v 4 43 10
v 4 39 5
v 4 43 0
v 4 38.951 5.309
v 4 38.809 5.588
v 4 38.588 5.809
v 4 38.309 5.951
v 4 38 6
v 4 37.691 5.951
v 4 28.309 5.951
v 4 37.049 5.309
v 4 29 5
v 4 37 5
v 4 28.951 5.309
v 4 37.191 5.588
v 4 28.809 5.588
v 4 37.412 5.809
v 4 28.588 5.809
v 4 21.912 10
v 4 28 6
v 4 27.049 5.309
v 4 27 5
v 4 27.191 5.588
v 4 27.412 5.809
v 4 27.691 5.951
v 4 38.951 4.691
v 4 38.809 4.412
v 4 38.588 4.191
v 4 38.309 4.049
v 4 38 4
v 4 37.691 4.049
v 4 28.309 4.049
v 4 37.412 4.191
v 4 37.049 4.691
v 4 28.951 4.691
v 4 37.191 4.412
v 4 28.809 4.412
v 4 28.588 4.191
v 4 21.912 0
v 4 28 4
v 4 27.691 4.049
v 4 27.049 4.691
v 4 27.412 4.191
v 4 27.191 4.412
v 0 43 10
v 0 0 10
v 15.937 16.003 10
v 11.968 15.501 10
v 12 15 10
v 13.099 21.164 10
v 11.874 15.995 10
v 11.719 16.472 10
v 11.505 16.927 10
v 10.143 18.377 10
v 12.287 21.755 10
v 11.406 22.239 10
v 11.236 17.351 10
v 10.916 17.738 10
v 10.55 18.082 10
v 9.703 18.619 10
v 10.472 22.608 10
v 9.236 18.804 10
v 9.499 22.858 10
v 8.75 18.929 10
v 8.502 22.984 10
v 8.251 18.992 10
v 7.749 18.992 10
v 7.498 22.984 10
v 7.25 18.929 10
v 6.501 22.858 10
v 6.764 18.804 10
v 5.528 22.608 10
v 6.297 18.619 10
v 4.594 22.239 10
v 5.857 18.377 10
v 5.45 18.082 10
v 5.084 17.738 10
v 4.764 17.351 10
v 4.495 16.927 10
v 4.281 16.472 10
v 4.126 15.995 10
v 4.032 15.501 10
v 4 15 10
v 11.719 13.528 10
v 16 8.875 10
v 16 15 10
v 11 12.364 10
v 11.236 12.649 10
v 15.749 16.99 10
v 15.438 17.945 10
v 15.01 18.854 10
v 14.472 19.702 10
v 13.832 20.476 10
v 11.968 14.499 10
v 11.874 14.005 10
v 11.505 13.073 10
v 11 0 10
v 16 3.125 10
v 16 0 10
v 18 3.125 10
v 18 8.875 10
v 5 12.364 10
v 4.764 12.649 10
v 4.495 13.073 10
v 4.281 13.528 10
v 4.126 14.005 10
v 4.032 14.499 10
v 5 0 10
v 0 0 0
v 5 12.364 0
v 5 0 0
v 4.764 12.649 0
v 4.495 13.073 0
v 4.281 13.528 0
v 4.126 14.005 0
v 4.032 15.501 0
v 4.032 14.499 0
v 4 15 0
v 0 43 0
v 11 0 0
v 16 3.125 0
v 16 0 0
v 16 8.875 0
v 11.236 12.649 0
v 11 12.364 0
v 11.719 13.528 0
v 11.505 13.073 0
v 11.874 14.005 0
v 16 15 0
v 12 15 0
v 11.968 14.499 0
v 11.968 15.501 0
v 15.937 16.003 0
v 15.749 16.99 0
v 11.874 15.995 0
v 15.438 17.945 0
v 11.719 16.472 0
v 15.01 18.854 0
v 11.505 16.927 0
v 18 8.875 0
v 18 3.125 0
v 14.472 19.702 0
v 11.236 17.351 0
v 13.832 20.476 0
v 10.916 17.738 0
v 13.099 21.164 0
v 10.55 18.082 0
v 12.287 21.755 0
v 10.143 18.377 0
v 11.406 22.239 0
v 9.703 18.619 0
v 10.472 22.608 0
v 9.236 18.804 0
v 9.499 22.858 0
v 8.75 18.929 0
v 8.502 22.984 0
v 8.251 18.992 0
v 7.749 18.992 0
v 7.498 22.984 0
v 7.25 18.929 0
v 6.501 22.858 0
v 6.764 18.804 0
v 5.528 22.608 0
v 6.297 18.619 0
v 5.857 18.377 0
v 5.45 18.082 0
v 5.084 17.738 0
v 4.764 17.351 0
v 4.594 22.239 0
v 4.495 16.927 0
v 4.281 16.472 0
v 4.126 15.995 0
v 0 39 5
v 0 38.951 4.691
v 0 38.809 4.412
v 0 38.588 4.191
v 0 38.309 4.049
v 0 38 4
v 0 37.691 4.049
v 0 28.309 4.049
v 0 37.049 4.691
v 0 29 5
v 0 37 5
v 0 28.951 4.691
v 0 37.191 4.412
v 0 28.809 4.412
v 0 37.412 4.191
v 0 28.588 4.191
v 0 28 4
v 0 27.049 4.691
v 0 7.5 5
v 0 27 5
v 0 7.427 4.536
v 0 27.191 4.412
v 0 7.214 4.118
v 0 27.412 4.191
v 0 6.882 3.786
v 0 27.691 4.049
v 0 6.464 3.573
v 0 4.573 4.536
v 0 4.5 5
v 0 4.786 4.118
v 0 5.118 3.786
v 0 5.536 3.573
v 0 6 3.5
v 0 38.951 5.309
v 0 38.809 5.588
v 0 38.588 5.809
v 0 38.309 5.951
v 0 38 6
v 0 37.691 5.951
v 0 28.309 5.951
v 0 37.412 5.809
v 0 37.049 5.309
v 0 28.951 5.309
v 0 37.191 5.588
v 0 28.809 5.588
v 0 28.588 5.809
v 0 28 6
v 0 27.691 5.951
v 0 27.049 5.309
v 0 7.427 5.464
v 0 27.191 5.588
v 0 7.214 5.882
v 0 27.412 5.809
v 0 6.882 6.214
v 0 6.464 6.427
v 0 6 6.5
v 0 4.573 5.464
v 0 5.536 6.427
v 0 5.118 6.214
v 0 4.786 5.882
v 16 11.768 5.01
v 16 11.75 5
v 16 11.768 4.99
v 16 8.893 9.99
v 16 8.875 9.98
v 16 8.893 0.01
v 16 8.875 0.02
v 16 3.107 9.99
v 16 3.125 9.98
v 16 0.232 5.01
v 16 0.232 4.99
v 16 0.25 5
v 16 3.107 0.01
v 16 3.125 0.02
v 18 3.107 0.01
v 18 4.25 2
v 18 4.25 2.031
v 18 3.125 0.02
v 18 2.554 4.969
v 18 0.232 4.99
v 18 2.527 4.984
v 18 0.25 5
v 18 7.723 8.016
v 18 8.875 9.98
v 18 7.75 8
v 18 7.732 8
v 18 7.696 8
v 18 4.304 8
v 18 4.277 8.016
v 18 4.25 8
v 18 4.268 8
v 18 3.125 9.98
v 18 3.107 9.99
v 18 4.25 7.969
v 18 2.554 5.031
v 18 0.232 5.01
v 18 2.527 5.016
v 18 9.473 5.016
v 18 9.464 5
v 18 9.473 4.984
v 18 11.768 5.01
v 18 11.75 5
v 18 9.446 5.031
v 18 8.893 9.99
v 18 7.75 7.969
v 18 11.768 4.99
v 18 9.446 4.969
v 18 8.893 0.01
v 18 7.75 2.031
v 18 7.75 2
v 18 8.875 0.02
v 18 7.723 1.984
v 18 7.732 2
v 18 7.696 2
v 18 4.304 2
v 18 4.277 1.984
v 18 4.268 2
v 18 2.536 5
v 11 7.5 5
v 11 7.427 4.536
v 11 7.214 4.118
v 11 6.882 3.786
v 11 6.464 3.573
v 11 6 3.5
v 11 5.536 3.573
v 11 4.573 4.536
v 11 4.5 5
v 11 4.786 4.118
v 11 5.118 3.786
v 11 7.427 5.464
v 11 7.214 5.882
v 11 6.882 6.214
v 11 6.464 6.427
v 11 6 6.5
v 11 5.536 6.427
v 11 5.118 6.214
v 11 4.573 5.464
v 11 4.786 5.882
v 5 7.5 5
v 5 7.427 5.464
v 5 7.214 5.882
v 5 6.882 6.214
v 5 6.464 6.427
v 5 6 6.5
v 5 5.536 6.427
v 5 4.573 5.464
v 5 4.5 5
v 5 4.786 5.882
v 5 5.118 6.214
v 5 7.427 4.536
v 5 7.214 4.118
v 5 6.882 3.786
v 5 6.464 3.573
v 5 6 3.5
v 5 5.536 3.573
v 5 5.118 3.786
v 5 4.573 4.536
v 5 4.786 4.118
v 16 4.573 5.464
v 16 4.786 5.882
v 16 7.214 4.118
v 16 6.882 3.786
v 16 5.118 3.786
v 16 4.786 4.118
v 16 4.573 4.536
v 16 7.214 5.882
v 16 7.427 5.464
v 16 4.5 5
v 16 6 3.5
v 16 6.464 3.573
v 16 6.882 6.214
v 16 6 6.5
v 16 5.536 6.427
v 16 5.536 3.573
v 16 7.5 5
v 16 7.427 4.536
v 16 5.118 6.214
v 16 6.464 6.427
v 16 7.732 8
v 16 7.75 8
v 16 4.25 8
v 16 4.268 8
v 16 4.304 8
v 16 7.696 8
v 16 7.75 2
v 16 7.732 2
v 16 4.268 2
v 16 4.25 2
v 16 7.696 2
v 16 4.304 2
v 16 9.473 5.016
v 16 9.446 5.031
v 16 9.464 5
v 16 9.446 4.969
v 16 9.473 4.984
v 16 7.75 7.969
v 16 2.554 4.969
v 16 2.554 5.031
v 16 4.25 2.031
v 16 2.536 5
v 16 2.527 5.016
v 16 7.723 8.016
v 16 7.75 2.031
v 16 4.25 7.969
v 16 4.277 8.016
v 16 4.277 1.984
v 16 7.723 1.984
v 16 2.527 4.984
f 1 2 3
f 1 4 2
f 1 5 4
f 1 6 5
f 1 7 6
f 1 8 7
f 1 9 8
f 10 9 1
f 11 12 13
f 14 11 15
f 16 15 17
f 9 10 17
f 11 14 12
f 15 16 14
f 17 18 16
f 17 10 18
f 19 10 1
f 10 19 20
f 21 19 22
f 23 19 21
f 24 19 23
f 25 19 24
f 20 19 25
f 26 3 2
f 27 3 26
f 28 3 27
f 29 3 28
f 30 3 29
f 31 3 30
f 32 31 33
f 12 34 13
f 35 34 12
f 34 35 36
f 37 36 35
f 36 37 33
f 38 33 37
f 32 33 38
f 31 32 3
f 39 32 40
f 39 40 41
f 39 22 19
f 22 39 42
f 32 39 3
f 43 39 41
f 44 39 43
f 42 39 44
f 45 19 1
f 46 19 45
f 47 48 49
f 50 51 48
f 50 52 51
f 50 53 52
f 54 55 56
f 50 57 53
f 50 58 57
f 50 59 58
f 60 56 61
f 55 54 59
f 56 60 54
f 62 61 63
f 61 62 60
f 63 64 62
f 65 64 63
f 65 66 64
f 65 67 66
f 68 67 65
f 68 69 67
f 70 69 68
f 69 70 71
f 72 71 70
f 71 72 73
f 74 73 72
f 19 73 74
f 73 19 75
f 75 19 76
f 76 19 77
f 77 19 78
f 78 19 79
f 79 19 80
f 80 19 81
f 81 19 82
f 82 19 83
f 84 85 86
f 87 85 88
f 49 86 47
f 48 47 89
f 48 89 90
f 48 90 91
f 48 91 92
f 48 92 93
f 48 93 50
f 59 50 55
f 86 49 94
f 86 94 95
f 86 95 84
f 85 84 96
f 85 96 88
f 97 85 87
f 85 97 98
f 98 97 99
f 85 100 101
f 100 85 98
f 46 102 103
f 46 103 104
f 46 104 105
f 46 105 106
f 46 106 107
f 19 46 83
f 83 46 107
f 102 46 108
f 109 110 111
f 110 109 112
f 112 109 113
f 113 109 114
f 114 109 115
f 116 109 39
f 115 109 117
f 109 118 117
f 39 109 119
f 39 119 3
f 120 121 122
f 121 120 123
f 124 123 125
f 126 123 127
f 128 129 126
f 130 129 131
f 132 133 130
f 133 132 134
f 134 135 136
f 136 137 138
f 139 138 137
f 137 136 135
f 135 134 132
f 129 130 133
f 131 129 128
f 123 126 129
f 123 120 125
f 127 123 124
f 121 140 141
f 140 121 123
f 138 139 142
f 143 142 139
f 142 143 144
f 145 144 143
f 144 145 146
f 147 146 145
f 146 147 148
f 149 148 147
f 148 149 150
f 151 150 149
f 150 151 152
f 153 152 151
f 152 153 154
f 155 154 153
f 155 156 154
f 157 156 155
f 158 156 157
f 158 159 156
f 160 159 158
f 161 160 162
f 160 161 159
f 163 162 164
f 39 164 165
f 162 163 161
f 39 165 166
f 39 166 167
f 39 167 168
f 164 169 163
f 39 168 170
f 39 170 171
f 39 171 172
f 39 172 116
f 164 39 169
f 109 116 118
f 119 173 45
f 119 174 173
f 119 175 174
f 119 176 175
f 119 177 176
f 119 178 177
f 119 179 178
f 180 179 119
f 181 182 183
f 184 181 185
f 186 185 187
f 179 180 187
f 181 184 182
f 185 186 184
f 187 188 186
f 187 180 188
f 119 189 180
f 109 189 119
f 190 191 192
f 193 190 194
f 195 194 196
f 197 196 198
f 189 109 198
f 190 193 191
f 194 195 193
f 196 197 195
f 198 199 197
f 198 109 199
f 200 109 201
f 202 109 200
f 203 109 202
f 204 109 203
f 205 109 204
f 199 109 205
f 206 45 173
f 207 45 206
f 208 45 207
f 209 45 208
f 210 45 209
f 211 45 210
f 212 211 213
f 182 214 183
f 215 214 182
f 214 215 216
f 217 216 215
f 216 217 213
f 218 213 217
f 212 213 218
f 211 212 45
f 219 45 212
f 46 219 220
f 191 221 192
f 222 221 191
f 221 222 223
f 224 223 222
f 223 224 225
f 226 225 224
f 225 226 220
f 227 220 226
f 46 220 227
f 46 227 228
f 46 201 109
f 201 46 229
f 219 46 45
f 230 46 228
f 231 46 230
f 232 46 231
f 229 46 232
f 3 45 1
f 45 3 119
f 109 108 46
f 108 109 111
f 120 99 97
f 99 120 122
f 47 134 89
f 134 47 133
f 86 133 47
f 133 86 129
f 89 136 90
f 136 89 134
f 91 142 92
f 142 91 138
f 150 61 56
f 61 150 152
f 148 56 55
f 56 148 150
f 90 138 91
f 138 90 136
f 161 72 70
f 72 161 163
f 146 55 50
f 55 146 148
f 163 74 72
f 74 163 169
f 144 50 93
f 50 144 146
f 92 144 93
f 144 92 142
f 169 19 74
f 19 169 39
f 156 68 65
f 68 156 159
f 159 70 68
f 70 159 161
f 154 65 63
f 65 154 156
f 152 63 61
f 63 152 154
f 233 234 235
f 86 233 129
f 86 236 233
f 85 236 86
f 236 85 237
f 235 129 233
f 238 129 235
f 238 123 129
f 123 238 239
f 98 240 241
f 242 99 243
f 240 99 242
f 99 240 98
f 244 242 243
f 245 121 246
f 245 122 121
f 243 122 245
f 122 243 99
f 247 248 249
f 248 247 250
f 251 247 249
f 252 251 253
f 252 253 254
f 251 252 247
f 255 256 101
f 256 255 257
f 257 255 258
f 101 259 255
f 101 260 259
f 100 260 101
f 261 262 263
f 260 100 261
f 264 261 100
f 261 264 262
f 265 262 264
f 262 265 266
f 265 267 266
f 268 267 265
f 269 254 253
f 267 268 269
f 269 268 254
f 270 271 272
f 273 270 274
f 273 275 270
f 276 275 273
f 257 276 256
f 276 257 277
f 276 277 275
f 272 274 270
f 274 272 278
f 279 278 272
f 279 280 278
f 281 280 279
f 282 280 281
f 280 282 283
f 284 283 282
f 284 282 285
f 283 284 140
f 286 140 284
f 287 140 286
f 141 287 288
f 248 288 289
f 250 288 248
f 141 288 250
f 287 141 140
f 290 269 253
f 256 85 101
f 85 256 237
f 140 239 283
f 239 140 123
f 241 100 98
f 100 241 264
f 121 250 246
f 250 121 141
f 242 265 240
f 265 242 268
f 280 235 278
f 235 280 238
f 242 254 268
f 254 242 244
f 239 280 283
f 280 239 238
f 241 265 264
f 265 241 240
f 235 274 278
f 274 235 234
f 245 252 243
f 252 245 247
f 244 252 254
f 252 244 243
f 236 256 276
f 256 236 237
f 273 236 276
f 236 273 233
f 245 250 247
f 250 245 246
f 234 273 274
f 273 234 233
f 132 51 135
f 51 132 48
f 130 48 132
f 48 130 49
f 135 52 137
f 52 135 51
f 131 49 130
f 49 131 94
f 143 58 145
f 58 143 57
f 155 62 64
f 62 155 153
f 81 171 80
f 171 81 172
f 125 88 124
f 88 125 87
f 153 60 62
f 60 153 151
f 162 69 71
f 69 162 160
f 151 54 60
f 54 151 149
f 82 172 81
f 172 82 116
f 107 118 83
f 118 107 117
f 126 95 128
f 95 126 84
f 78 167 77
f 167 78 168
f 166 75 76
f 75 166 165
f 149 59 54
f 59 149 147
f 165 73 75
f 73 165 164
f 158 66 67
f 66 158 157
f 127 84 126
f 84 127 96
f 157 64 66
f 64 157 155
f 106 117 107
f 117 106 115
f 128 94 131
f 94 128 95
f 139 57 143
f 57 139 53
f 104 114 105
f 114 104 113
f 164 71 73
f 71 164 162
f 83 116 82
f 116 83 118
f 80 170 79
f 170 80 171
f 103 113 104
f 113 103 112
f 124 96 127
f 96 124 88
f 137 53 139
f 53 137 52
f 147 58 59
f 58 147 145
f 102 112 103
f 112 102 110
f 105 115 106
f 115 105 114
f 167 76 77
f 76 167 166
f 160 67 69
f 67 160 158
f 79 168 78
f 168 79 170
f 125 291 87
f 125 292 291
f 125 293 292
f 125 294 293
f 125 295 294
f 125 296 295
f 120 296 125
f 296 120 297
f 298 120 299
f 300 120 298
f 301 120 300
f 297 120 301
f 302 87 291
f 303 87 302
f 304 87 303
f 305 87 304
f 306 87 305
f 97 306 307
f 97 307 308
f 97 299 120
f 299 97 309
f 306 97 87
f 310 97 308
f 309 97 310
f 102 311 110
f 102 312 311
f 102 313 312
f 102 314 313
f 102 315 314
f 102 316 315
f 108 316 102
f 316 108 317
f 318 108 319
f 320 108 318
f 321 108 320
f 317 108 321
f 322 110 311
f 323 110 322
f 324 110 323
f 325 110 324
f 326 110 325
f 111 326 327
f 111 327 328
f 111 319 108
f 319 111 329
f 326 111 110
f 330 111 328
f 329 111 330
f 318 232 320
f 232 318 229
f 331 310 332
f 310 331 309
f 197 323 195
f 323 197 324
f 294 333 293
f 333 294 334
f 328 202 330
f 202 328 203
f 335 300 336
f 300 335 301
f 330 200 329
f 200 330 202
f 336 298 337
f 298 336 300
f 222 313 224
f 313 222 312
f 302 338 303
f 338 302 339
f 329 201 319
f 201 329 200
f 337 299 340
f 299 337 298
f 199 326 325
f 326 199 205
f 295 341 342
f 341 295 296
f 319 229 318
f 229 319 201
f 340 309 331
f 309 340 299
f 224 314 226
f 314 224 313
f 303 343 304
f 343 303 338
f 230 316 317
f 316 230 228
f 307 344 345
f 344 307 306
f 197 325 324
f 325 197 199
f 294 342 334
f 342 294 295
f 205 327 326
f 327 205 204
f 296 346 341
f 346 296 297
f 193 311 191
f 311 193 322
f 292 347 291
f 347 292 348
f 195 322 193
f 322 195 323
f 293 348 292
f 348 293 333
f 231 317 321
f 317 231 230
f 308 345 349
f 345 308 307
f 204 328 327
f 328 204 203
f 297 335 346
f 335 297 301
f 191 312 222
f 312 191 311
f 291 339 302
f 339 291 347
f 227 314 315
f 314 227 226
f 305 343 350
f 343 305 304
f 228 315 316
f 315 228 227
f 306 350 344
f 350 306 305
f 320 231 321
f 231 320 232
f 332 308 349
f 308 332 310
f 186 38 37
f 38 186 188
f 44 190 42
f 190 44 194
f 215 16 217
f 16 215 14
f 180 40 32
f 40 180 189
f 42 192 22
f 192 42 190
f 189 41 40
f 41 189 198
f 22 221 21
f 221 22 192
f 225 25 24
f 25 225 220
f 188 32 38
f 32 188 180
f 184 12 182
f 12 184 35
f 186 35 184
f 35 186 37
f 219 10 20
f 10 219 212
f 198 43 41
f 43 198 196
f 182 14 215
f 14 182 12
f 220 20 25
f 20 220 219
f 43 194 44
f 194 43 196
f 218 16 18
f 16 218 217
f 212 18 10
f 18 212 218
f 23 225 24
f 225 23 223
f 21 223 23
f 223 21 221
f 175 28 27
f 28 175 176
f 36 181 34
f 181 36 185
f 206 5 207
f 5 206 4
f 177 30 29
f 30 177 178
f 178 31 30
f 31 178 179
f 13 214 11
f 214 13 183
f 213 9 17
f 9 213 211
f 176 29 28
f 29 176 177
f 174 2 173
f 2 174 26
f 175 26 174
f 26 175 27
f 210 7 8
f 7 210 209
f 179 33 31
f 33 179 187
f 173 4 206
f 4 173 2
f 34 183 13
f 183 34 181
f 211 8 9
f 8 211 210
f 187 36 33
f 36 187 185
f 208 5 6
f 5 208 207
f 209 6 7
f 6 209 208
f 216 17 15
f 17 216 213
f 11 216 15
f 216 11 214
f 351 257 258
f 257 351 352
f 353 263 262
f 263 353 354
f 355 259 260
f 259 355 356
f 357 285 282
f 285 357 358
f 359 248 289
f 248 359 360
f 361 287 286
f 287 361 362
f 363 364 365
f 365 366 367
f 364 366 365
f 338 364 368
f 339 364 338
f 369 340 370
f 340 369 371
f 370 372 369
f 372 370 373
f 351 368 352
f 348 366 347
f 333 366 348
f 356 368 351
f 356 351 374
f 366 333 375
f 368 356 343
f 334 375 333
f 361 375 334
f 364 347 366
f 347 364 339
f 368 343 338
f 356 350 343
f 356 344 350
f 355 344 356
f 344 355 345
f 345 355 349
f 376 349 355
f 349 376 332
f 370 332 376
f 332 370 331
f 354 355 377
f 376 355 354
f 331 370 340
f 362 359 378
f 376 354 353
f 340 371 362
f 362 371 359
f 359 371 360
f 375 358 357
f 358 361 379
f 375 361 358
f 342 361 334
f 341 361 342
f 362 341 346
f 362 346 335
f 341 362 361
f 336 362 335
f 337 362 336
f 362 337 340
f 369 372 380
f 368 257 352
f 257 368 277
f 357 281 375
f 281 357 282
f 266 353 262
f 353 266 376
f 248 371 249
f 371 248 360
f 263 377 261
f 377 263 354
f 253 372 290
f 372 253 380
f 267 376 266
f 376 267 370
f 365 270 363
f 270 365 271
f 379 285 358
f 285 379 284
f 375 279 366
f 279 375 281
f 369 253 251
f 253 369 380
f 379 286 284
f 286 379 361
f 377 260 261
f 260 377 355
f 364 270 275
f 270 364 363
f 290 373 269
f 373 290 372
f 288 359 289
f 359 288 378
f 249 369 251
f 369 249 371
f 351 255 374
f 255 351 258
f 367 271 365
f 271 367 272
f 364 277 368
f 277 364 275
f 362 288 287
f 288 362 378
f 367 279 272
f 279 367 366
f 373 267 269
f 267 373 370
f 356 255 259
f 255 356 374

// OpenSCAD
difference() {
	union() {
		cube([4,43,10]);  //4,45,10
		translate([8, 15,0]) cylinder(h = 10, r = 8, $fn = 50);
		cube([16, 15,10]);
		
		translate([17,6,5]) cube([2,5.75,10], center=true);
		translate([17,6,5]) rotate(a=[60,0,0]) cube([2,5.75,10], center=true);
		translate([17,6,5]) rotate(a=[120,0,0]) cube([2,5.75,10], center=true);
	}
	translate([8, 15,0]) cylinder(h = 10, r = 4, $fn = 50);
	translate([5, 0, 0]) cube([6, 15,10]);
	translate([-10, 6, 5]) rotate(a=[0, 90, 0]) cylinder(h = 30, r = 1.5, $fn= 20);
	translate([-10, 28, 5]) rotate(a=[0, 90, 0]) cylinder(h = 30, r = 1, $fn= 20);
	translate([-10, 38, 5]) rotate(a=[0, 90, 0]) cylinder(h = 30, r = 1, $fn= 20);
	translate([17,6,5]) cube([2,3.5,6], center=true);
	translate([17,6,5]) rotate(a=[60,0,0]) cube([2,3.5,6], center=true);
	translate([17,6,5]) rotate(a=[120,0,0]) cube([2,3.5,6], center=true);
}
